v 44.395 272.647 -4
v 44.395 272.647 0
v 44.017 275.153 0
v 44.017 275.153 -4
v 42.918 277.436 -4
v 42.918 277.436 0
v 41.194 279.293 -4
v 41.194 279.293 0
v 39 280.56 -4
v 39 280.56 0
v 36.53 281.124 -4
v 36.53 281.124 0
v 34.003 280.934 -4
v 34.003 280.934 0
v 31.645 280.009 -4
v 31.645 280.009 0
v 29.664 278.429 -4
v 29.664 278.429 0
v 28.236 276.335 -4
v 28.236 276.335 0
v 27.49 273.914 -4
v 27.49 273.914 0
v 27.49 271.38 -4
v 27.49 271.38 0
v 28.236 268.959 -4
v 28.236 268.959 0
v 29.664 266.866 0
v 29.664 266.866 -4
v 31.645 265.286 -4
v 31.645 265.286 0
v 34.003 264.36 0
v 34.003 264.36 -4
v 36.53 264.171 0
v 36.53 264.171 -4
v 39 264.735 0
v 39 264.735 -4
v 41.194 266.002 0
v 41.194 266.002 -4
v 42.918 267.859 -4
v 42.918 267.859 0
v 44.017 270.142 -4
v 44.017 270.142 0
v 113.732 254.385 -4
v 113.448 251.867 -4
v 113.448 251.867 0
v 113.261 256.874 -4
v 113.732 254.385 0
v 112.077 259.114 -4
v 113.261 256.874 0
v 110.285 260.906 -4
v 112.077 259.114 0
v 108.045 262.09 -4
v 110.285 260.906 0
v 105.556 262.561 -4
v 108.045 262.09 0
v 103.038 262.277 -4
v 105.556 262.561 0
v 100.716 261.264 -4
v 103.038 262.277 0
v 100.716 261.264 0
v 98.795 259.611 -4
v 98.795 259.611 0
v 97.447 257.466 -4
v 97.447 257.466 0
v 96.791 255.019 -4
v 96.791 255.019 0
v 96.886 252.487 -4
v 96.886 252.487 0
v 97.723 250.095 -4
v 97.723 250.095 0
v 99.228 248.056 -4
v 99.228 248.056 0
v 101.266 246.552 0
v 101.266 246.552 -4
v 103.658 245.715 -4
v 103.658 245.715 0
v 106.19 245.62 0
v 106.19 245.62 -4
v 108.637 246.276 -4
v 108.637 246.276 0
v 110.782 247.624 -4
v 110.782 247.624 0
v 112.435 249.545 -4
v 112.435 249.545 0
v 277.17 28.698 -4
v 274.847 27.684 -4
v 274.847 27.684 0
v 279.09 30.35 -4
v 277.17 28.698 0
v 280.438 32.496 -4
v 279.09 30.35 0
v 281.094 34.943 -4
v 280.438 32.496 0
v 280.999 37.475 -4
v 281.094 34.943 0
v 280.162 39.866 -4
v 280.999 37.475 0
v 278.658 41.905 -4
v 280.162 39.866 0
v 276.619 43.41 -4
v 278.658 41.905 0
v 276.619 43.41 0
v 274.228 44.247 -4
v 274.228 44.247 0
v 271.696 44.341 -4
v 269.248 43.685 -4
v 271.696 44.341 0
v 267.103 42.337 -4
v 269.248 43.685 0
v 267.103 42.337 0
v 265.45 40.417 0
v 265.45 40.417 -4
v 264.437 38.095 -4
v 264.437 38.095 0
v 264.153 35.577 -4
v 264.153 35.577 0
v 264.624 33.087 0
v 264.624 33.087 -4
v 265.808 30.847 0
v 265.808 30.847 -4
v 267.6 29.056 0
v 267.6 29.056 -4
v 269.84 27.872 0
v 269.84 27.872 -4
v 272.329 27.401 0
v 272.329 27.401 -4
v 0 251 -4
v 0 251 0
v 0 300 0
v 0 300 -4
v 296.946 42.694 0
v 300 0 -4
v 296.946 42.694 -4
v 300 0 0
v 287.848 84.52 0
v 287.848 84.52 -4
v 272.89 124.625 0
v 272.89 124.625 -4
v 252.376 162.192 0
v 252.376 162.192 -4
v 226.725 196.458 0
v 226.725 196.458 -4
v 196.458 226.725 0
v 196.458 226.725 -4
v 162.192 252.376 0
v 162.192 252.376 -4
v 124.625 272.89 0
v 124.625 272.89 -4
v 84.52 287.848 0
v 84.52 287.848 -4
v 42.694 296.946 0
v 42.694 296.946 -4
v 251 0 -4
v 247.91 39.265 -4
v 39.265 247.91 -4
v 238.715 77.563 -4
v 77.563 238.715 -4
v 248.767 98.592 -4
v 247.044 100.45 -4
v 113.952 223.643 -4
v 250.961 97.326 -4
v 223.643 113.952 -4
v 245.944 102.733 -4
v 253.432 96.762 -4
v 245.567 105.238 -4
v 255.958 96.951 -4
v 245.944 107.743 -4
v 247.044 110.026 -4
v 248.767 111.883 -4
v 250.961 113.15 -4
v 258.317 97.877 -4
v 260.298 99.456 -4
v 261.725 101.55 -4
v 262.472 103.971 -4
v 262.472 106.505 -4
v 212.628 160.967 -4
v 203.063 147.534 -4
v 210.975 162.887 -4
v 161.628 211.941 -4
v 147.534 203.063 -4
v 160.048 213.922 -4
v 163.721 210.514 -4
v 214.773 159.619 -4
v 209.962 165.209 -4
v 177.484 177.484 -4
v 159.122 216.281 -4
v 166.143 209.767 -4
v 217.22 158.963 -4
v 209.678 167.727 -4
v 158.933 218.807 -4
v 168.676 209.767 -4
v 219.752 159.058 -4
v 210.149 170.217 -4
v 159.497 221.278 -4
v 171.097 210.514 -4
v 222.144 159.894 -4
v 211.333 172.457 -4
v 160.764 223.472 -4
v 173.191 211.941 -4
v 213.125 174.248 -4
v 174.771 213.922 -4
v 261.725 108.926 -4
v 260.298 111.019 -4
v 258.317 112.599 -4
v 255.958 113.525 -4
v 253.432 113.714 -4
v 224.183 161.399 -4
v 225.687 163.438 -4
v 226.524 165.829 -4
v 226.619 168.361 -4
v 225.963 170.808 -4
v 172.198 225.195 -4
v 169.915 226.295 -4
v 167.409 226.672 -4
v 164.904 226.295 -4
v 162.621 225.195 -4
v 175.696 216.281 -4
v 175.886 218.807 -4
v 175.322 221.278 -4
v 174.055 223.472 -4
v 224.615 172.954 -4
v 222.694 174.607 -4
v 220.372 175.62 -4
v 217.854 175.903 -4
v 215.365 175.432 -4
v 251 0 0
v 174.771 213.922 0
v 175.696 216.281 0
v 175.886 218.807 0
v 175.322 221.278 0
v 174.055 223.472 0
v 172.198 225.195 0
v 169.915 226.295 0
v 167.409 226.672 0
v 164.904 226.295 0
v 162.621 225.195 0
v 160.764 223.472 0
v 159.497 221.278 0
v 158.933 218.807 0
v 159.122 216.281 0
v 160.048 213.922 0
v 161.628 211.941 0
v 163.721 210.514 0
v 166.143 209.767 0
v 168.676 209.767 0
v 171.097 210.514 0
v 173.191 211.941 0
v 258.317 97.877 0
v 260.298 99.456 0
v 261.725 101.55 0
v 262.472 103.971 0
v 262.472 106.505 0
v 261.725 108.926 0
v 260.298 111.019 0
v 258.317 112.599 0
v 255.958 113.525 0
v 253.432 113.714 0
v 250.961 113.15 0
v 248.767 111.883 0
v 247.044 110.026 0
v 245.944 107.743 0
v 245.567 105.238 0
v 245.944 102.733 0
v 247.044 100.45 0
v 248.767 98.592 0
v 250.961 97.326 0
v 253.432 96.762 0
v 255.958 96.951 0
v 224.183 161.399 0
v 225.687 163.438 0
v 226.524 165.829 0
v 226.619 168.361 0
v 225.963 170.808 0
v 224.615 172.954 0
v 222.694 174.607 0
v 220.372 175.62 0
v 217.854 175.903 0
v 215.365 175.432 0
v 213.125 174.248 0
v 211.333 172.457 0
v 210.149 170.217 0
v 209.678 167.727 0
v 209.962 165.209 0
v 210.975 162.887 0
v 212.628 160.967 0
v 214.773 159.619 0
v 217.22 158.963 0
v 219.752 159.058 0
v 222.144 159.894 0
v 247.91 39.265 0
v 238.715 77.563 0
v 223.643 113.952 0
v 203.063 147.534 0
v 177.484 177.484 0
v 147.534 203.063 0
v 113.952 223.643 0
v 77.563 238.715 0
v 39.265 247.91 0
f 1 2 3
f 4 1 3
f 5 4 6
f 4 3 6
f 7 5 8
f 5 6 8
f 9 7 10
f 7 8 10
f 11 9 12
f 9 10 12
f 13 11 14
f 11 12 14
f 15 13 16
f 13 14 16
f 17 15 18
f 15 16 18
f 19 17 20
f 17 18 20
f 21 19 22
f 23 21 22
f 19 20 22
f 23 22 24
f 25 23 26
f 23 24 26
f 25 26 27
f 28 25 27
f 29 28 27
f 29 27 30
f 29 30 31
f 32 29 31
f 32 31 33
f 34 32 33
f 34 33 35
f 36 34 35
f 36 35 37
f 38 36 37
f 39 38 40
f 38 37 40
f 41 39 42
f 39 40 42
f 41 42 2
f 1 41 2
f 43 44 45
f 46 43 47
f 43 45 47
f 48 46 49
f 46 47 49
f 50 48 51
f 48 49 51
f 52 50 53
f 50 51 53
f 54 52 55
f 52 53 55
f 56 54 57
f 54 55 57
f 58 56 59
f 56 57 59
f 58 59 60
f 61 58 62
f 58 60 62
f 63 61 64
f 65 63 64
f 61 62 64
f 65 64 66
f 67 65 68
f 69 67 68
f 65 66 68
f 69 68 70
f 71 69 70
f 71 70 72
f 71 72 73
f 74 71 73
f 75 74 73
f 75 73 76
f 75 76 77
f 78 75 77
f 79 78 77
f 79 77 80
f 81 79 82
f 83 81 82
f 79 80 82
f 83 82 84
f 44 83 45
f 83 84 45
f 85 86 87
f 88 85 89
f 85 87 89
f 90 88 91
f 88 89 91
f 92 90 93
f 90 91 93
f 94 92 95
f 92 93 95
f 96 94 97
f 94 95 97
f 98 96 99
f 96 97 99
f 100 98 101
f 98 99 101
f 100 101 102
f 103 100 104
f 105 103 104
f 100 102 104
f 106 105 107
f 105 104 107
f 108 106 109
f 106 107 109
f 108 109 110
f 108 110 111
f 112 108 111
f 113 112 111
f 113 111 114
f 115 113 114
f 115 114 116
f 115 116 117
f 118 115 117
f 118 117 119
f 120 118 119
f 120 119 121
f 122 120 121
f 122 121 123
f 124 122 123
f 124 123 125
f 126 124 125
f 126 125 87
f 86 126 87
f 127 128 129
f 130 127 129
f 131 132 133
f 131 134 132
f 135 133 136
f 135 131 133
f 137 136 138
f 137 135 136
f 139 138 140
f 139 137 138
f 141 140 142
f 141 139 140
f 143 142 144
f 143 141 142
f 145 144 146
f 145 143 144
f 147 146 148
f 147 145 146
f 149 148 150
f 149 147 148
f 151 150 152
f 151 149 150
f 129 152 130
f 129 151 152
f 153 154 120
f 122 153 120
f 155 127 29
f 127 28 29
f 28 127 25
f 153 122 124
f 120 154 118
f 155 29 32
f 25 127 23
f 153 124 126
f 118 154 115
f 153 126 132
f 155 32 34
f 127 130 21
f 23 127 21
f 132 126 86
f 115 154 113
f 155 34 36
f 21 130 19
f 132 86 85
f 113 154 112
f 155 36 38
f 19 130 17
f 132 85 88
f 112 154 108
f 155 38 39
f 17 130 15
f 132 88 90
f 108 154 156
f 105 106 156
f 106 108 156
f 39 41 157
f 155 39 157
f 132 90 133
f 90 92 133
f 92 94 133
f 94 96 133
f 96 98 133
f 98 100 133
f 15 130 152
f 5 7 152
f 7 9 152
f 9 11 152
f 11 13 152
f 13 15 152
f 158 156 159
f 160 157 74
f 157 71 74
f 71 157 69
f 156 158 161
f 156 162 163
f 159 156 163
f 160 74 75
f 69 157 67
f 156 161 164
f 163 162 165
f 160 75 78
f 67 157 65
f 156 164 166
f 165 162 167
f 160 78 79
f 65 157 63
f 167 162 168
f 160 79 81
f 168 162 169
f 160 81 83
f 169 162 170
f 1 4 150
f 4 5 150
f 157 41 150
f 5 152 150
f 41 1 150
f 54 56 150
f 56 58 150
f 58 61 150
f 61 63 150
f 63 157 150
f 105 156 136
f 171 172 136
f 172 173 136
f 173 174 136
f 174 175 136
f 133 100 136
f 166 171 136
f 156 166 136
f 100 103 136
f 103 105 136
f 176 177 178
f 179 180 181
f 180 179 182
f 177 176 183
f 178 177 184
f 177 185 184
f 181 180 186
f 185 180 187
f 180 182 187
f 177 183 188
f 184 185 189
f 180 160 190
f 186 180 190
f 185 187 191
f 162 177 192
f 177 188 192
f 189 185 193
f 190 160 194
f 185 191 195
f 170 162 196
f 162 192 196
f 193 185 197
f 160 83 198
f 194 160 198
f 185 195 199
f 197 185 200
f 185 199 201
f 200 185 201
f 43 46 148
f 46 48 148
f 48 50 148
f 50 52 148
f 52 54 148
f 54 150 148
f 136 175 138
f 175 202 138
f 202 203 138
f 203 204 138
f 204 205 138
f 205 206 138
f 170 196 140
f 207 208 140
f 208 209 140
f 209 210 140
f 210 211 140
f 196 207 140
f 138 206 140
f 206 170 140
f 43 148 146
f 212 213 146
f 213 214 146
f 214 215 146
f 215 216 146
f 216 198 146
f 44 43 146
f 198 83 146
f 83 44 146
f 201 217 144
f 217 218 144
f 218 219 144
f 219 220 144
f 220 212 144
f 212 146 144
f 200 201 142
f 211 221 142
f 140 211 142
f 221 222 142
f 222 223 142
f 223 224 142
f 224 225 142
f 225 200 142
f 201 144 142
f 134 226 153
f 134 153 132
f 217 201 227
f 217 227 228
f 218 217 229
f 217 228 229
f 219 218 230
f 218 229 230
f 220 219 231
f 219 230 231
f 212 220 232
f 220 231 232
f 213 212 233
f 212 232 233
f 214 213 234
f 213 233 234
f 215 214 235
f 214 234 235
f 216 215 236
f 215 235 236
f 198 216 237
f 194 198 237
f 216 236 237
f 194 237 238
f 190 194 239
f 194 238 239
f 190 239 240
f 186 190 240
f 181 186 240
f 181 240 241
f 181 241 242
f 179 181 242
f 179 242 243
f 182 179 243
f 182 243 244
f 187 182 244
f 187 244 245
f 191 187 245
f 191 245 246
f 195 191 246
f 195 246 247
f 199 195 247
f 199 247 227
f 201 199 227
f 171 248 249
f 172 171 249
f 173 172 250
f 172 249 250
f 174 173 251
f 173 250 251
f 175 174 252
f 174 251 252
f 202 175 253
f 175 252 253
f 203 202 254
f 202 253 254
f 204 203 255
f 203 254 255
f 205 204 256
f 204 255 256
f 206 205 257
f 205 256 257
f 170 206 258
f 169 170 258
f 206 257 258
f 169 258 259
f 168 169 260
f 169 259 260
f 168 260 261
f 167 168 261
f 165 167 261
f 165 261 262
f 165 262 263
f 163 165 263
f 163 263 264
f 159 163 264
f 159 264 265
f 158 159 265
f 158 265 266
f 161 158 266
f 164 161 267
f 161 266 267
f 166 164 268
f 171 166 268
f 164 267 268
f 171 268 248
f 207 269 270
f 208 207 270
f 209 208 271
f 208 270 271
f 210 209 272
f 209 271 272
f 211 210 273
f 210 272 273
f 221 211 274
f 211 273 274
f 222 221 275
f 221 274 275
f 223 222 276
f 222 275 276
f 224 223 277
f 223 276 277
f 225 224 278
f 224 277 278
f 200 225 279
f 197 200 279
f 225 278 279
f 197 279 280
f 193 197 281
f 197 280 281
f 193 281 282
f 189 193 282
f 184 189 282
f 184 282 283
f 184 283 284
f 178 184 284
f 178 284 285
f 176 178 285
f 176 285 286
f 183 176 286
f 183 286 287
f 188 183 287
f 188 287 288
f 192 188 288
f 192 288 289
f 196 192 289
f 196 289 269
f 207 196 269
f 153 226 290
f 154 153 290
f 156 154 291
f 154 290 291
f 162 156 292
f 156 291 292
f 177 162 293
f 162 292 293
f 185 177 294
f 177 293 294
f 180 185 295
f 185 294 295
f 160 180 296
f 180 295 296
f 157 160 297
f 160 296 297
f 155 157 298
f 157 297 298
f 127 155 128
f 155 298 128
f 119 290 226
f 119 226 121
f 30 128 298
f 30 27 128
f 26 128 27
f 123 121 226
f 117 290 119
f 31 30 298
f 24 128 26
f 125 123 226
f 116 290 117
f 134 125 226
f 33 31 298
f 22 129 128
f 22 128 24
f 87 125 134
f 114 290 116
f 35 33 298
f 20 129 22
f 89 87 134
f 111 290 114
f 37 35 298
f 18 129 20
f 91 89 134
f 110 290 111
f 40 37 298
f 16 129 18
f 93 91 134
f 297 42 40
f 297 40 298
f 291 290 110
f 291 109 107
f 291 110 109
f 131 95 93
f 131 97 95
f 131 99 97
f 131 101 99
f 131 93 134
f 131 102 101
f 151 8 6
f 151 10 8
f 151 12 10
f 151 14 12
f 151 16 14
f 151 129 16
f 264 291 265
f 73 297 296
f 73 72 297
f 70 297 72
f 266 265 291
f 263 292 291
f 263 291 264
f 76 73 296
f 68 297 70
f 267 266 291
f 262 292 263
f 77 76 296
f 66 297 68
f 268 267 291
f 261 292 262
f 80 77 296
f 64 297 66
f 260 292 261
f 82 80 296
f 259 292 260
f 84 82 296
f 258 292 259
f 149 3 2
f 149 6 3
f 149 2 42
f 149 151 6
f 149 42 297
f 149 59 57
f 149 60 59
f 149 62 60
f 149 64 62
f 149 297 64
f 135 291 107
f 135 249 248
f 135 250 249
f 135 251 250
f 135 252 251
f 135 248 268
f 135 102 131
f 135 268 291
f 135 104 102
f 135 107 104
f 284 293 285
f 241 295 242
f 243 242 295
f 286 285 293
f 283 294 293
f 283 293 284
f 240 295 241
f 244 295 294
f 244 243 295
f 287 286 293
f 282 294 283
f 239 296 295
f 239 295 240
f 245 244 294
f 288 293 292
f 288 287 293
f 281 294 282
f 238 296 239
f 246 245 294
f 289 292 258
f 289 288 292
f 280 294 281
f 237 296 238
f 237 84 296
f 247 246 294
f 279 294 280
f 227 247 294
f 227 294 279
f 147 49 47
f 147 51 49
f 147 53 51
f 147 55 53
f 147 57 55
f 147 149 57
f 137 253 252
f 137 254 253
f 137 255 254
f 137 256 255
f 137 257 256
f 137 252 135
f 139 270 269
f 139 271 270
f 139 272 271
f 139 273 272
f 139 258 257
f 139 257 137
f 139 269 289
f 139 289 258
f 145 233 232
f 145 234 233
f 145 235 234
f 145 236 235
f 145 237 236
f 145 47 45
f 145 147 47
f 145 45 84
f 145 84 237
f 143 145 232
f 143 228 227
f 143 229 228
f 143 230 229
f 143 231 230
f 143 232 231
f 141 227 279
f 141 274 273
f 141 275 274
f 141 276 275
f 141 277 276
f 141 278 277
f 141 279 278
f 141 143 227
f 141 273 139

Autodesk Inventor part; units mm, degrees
ref_plane "YZ Plane" through (0, 0, 0) normal (1, 0, 0) x (0, 1, 0)
ref_plane "XZ Plane" through (0, 0, 0) normal (0, 1, 0) x (-1, 0, 0)
ref_plane "XY Plane" through (0, 0, 0) normal (0, 0, 1) x (1, 0, 0)
sketch "Sketch1" plane through (0, 0, 0) normal (0, 0, 1) x (1, 0, 0)
  arc A0 (251, 0) -> (0, 251) centre (0, 0) ccw
  arc A1 (0, 300) -> (300, 0) centre (0, 0) ccw construction
  circle A2 centre (0, 0) radius 320 construction
  line L0 (0, 0) -> (0, 251) construction
  line L1 (0, 0) -> (251, 0) construction
  arc A3 (300, 0) -> (0, 300) centre (0, 0) ccw
  line L2 (0, 251) -> (0, 300)
  arc A4 (0, 251) -> (251, 0) centre (0, 0) ccw construction
  line L3 (251, 0) -> (300, 0)
  dimension "d0" = 502
  dimension "d1" = 600
  dimension "d2" = 640
extrude "Plate1" add sketch "Sketch1" against normal blind 4
sketch "Sketch3" plane through (0, 0, 0) normal (0, 0, 1) x (1, 0, 0)
  circle A0 centre (0, 0) radius 275 construction
  line L0 (0, 0) -> (0, 300) construction
  arc A1 (300, 0) -> (0, 300) centre (0, 0) ccw projected
  line L1 (0, 0) -> (39.1579, 297.4335) construction
  circle A2 centre (35.8947, 272.6473) radius 8.5
  dimension "d12" = 550
  dimension "d13" = 7.5
  dimension "d14" = 17
extrude "Extrusion2" cut sketch "Sketch3" against normal through all
pattern_circular "Circular Pattern1" count 6 over 75 about axis through (0, 0, -10) along (0, 0, -1) of "Extrusion2"
equation "\"d5\" = Thickness"
equation "\"BendReliefWidth\" = Thickness"
equation "\"BendReliefDepth\" = 0.5 * Thickness"
equation "\"CornerReliefSize\" = 4 * Thickness"
equation "\"MinimumRemnant\" = 2 * Thickness"
equation "\"TransitionRadius\" = BendRadius"
equation "\"JacobiRadiusSize\" = BendRadius"
equation "\"GapSize\" = Thickness"
equation "\"Thickness\" = 4"
equation "\"BendRadius\" = 6"
properties part number "MSC 403 FLANGE 500" material "Stainless Steel"
